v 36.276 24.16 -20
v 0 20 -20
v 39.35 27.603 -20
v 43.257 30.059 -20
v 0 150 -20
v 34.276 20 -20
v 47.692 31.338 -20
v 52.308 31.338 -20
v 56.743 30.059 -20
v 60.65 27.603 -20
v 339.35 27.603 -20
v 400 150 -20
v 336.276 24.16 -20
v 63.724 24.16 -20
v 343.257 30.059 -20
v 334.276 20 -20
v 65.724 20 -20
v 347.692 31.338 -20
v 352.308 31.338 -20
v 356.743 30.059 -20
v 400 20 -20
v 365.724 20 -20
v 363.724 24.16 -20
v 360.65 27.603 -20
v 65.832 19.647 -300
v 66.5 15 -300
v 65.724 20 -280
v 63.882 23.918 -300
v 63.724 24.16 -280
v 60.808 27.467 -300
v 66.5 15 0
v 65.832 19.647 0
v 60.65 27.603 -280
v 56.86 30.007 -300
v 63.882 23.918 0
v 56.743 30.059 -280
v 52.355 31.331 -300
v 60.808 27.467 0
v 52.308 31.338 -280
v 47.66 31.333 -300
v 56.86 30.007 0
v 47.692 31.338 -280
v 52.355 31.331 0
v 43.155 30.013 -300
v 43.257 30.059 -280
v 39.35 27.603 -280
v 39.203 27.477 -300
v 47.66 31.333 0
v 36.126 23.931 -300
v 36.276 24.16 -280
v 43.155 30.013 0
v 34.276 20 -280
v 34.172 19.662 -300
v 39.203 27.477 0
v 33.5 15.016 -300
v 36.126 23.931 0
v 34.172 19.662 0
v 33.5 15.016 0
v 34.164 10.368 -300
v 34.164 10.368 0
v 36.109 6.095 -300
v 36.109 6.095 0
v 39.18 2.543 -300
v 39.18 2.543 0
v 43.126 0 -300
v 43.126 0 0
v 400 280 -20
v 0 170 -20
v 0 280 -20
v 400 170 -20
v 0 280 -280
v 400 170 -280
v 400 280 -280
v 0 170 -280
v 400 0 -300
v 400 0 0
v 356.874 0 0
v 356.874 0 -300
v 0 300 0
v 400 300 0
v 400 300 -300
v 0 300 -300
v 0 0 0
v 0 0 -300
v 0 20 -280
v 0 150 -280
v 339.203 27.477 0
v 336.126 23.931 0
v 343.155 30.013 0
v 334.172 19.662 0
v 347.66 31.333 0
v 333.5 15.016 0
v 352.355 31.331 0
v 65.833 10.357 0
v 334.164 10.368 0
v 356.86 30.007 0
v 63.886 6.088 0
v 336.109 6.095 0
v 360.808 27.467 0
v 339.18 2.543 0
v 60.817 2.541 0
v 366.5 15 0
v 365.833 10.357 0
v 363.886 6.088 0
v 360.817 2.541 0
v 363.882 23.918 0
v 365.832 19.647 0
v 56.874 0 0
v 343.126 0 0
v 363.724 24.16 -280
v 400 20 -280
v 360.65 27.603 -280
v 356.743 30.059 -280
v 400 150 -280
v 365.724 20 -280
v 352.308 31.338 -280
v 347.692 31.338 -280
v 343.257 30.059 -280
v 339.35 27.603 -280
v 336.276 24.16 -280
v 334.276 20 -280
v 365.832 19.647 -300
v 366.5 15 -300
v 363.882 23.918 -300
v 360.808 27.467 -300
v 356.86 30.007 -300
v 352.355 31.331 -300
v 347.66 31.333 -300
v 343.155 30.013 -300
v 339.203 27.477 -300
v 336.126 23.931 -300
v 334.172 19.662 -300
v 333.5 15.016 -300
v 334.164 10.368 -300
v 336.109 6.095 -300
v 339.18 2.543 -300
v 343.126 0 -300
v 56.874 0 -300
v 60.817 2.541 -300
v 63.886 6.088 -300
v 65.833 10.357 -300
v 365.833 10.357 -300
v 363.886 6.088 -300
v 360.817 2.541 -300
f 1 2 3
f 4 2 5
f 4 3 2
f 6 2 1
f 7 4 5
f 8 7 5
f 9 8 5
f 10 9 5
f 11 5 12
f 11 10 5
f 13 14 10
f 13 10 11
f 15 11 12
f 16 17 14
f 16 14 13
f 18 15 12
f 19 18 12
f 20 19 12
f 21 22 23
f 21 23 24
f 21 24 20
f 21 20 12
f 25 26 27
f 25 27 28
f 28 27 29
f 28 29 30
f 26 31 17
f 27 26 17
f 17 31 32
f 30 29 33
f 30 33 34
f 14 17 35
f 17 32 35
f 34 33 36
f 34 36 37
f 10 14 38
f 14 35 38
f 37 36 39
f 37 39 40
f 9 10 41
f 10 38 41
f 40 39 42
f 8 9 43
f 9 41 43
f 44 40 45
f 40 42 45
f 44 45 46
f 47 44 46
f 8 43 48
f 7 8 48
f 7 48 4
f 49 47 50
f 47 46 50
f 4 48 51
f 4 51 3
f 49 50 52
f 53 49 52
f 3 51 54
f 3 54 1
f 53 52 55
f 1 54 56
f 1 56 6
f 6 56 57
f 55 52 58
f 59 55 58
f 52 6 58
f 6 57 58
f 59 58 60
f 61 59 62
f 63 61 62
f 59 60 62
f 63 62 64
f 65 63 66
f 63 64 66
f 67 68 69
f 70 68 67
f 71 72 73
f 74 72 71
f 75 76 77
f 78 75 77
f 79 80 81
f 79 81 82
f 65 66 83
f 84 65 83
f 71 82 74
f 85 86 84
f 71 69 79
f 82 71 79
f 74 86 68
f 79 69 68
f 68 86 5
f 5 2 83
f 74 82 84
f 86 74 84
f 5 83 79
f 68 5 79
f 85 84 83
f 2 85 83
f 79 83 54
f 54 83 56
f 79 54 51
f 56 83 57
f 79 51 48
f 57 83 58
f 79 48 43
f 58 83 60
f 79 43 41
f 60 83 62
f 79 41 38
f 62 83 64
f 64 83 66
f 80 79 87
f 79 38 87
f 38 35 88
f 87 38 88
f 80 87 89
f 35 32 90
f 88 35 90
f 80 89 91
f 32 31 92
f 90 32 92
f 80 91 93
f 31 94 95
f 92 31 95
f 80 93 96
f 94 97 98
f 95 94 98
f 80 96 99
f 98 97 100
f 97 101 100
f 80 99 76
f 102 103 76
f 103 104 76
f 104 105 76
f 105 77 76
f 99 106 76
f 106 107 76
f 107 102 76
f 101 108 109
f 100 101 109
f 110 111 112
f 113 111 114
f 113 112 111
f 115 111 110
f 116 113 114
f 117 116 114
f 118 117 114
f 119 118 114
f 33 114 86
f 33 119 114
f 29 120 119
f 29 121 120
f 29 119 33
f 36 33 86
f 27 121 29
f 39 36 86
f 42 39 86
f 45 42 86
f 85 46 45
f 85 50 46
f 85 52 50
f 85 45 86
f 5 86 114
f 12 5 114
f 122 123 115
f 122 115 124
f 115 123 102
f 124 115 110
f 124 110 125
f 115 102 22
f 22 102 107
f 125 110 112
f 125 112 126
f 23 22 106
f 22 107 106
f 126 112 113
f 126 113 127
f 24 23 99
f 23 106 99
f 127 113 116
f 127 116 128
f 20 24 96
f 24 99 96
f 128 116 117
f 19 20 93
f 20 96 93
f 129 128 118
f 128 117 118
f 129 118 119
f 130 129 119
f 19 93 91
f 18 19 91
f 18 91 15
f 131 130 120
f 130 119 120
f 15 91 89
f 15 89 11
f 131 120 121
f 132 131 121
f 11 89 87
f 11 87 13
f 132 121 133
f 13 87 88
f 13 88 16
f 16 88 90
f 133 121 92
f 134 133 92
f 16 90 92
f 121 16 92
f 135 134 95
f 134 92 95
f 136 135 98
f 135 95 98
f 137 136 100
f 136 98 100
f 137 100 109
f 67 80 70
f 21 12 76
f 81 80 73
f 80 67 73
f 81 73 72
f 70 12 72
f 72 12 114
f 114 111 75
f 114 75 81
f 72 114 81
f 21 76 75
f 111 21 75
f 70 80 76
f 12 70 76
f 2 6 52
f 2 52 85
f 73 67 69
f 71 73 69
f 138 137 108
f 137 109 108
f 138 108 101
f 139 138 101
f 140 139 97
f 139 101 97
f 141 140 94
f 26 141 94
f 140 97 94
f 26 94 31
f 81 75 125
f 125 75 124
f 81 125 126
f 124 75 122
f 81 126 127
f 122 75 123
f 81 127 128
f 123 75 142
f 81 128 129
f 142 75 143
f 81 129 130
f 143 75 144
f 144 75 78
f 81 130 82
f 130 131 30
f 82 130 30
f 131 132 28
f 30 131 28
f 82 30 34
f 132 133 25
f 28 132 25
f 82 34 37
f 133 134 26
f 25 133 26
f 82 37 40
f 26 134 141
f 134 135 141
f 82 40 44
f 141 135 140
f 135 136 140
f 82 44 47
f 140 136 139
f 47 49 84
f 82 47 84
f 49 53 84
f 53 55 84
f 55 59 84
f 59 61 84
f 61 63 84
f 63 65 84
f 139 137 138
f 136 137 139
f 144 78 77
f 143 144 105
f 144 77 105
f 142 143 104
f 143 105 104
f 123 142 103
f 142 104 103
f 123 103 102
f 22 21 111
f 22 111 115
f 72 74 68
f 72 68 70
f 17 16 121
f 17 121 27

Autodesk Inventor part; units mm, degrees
ref_plane "YZ Plane" through (0, 0, 0) normal (1, 0, 0) x (0, 1, 0)
ref_plane "XZ Plane" through (0, 0, 0) normal (0, 1, 0) x (-1, 0, 0)
sketch "Sketch1" plane through (0, 0, 0) normal (0, 1, 0) x (-1, 0, 0)
  line L0 (0, 0) -> (-400, 0)
  line L1 (-400, 0) -> (-400, -300)
  line L2 (-400, -300) -> (0, -300)
  line L3 (0, -300) -> (0, 0)
  dimension "d0" = 400
  dimension "d1" = 300
extrude "Extrusion1" add sketch "Sketch1" along normal blind 300
shell "Shell2" thickness 20 removed faces 2 at (0, 100, -200) at (400, 100, -100)
sketch "Sketch2" plane through (0, 0, 0) normal (0, 0, 1) x (1, 0, 0)
  circle A0 centre (50, 15) radius 16.5
  circle A1 centre (350, 15) radius 16.5
  line L0 (0, 0) -> (400, 0) projected
  dimension "d13" = 33
  dimension "d14" = 33
  dimension "d19" = 15
  dimension "d20" = 15
extrude "Extrusion2" cut sketch "Sketch2" against normal through all
ref_plane "Work Plane1" through (0, 160, 0) normal (0, 1, 0) x (1, 0, 0)
sketch "Sketch3" plane through (0, 160, 0) normal (0, 1, 0) x (1, 0, 0)
  line L0 (400, 300) -> (0, 300) projected
  line L1 (0, 300) -> (400, 300)
  line L2 (400, 300) -> (400, 0)
  line L3 (400, 0) -> (0, 0)
  line L4 (0, 0) -> (0, 300)
extrude "Extrusion3" add sketch "Sketch3" along normal mid plane 20
